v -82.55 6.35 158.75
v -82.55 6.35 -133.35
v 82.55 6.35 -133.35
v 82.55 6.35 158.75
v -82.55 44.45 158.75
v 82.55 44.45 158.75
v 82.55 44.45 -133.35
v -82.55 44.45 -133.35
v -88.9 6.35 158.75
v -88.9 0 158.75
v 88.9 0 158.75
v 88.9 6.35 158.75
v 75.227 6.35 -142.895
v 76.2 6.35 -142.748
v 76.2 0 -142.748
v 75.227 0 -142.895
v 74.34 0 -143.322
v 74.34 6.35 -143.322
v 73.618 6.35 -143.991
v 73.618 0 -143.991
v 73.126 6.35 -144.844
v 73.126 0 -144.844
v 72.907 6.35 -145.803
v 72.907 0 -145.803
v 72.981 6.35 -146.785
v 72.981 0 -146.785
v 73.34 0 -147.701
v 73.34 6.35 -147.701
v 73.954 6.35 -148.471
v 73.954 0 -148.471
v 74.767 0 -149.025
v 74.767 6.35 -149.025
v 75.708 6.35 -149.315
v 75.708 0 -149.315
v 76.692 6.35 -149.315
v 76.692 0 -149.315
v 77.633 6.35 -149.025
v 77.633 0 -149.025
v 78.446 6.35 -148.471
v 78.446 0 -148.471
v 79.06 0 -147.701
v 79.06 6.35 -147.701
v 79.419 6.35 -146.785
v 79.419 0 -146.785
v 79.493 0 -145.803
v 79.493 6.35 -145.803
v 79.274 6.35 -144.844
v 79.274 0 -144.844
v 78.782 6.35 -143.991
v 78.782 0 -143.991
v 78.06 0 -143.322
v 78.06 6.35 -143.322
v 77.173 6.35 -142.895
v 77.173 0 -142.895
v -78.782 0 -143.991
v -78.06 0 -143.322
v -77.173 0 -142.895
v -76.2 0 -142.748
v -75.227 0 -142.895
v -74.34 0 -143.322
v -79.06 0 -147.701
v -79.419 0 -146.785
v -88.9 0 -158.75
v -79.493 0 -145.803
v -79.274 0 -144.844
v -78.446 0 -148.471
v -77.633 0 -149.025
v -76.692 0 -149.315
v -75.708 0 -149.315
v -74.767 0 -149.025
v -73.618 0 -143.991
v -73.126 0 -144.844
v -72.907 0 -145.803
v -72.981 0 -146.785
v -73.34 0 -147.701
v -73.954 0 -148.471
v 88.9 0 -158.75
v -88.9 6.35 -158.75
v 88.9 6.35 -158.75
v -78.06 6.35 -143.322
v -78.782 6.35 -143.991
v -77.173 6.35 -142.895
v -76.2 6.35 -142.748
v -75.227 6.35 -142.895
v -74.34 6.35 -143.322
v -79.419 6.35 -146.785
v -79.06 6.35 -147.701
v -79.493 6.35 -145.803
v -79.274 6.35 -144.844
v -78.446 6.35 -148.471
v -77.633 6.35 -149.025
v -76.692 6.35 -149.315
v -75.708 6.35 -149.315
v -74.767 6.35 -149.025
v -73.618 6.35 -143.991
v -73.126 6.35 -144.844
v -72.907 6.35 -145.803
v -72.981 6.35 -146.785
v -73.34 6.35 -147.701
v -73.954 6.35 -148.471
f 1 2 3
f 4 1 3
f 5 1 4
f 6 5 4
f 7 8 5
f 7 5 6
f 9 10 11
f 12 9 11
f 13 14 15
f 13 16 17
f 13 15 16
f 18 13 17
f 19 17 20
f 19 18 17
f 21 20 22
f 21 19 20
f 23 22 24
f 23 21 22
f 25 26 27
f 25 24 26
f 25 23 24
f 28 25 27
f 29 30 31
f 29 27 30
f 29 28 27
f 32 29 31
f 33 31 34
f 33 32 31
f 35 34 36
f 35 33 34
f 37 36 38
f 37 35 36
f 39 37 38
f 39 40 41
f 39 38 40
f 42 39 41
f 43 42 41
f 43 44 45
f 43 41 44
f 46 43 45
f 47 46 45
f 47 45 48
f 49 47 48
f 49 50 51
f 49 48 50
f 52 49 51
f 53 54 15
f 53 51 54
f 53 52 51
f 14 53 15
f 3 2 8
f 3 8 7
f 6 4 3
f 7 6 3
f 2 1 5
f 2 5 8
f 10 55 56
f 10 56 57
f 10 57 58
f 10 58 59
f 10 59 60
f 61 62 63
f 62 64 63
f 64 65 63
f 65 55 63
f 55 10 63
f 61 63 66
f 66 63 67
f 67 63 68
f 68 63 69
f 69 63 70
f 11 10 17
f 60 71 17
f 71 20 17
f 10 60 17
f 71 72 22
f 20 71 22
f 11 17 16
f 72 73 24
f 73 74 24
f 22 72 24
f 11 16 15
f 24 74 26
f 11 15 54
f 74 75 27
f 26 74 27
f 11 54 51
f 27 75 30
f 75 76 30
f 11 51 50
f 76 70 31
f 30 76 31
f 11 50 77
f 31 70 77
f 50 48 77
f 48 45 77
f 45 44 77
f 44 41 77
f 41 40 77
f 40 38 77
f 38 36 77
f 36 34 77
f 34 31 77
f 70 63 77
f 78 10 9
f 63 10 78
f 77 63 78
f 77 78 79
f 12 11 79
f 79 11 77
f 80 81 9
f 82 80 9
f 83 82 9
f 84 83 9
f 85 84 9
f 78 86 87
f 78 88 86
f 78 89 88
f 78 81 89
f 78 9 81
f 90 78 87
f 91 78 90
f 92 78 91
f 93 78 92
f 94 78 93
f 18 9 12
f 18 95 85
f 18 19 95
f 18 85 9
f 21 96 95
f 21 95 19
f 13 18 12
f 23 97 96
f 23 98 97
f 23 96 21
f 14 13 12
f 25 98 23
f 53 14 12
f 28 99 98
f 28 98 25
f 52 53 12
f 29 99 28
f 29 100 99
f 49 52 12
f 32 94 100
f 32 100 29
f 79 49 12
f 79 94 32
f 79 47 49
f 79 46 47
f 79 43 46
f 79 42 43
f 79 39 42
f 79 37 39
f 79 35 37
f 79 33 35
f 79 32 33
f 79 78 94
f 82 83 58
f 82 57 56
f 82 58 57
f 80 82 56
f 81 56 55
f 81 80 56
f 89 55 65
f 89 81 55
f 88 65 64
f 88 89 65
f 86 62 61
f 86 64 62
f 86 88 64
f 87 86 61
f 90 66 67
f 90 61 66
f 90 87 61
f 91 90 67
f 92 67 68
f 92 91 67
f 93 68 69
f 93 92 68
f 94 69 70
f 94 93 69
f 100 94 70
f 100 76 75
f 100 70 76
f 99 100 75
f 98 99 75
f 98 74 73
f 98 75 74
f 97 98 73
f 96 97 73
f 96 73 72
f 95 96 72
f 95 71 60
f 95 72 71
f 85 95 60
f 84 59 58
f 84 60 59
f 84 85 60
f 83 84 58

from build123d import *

# Parameters (mm, degrees)
SKETCH1_W               = 177.8
SKETCH1_H               = 317.5
BOSS_EXTRUDE1_DEPTH     = 6.35
SKETCH2_W               = 165.1
SKETCH2_H               = 292.1
BOSS_EXTRUDE2_DEPTH     = 38.1
CUT_EXTRUDE1_DEPTH      = 188.298091288
CUT_EXTRUDE1_DEPTH_BACK = 188.298091288
SKETCH3_R               = 3.302


with BuildPart() as part:
    # Sketch1 → Boss-Extrude1 (new body)
    with BuildSketch(Plane(origin=(0, 0, 0), x_dir=(1, 0, 0), z_dir=(0, 1, 0))):
        Rectangle(SKETCH1_W, SKETCH1_H)
    extrude(amount=BOSS_EXTRUDE1_DEPTH)

    # Sketch3 → Cut-Extrude1 (cut, two sides: drawn at the far end of the back side and taken through both)
    with BuildSketch(Plane.XZ.offset(-CUT_EXTRUDE1_DEPTH_BACK)):
        with Locations(Location((76.2, -146.05, 0), (0, 0, 90))):
            Circle(SKETCH3_R)
        with Locations(Location((-76.2, -146.05, 0), (0, 0, 90))):
            Circle(SKETCH3_R)
    extrude(amount=CUT_EXTRUDE1_DEPTH + CUT_EXTRUDE1_DEPTH_BACK, mode=Mode.SUBTRACT)


with BuildPart() as body_2:
    # Sketch2 → Boss-Extrude2 (new body)
    with BuildSketch(Plane(origin=(0, 6.35, 0), x_dir=(1, 0, 0), z_dir=(0, 1, 0))):
        with Locations((0, -12.7)):
            Rectangle(SKETCH2_W, SKETCH2_H)
    extrude(amount=BOSS_EXTRUDE2_DEPTH)


solid = Compound([part.part, body_2.part])
